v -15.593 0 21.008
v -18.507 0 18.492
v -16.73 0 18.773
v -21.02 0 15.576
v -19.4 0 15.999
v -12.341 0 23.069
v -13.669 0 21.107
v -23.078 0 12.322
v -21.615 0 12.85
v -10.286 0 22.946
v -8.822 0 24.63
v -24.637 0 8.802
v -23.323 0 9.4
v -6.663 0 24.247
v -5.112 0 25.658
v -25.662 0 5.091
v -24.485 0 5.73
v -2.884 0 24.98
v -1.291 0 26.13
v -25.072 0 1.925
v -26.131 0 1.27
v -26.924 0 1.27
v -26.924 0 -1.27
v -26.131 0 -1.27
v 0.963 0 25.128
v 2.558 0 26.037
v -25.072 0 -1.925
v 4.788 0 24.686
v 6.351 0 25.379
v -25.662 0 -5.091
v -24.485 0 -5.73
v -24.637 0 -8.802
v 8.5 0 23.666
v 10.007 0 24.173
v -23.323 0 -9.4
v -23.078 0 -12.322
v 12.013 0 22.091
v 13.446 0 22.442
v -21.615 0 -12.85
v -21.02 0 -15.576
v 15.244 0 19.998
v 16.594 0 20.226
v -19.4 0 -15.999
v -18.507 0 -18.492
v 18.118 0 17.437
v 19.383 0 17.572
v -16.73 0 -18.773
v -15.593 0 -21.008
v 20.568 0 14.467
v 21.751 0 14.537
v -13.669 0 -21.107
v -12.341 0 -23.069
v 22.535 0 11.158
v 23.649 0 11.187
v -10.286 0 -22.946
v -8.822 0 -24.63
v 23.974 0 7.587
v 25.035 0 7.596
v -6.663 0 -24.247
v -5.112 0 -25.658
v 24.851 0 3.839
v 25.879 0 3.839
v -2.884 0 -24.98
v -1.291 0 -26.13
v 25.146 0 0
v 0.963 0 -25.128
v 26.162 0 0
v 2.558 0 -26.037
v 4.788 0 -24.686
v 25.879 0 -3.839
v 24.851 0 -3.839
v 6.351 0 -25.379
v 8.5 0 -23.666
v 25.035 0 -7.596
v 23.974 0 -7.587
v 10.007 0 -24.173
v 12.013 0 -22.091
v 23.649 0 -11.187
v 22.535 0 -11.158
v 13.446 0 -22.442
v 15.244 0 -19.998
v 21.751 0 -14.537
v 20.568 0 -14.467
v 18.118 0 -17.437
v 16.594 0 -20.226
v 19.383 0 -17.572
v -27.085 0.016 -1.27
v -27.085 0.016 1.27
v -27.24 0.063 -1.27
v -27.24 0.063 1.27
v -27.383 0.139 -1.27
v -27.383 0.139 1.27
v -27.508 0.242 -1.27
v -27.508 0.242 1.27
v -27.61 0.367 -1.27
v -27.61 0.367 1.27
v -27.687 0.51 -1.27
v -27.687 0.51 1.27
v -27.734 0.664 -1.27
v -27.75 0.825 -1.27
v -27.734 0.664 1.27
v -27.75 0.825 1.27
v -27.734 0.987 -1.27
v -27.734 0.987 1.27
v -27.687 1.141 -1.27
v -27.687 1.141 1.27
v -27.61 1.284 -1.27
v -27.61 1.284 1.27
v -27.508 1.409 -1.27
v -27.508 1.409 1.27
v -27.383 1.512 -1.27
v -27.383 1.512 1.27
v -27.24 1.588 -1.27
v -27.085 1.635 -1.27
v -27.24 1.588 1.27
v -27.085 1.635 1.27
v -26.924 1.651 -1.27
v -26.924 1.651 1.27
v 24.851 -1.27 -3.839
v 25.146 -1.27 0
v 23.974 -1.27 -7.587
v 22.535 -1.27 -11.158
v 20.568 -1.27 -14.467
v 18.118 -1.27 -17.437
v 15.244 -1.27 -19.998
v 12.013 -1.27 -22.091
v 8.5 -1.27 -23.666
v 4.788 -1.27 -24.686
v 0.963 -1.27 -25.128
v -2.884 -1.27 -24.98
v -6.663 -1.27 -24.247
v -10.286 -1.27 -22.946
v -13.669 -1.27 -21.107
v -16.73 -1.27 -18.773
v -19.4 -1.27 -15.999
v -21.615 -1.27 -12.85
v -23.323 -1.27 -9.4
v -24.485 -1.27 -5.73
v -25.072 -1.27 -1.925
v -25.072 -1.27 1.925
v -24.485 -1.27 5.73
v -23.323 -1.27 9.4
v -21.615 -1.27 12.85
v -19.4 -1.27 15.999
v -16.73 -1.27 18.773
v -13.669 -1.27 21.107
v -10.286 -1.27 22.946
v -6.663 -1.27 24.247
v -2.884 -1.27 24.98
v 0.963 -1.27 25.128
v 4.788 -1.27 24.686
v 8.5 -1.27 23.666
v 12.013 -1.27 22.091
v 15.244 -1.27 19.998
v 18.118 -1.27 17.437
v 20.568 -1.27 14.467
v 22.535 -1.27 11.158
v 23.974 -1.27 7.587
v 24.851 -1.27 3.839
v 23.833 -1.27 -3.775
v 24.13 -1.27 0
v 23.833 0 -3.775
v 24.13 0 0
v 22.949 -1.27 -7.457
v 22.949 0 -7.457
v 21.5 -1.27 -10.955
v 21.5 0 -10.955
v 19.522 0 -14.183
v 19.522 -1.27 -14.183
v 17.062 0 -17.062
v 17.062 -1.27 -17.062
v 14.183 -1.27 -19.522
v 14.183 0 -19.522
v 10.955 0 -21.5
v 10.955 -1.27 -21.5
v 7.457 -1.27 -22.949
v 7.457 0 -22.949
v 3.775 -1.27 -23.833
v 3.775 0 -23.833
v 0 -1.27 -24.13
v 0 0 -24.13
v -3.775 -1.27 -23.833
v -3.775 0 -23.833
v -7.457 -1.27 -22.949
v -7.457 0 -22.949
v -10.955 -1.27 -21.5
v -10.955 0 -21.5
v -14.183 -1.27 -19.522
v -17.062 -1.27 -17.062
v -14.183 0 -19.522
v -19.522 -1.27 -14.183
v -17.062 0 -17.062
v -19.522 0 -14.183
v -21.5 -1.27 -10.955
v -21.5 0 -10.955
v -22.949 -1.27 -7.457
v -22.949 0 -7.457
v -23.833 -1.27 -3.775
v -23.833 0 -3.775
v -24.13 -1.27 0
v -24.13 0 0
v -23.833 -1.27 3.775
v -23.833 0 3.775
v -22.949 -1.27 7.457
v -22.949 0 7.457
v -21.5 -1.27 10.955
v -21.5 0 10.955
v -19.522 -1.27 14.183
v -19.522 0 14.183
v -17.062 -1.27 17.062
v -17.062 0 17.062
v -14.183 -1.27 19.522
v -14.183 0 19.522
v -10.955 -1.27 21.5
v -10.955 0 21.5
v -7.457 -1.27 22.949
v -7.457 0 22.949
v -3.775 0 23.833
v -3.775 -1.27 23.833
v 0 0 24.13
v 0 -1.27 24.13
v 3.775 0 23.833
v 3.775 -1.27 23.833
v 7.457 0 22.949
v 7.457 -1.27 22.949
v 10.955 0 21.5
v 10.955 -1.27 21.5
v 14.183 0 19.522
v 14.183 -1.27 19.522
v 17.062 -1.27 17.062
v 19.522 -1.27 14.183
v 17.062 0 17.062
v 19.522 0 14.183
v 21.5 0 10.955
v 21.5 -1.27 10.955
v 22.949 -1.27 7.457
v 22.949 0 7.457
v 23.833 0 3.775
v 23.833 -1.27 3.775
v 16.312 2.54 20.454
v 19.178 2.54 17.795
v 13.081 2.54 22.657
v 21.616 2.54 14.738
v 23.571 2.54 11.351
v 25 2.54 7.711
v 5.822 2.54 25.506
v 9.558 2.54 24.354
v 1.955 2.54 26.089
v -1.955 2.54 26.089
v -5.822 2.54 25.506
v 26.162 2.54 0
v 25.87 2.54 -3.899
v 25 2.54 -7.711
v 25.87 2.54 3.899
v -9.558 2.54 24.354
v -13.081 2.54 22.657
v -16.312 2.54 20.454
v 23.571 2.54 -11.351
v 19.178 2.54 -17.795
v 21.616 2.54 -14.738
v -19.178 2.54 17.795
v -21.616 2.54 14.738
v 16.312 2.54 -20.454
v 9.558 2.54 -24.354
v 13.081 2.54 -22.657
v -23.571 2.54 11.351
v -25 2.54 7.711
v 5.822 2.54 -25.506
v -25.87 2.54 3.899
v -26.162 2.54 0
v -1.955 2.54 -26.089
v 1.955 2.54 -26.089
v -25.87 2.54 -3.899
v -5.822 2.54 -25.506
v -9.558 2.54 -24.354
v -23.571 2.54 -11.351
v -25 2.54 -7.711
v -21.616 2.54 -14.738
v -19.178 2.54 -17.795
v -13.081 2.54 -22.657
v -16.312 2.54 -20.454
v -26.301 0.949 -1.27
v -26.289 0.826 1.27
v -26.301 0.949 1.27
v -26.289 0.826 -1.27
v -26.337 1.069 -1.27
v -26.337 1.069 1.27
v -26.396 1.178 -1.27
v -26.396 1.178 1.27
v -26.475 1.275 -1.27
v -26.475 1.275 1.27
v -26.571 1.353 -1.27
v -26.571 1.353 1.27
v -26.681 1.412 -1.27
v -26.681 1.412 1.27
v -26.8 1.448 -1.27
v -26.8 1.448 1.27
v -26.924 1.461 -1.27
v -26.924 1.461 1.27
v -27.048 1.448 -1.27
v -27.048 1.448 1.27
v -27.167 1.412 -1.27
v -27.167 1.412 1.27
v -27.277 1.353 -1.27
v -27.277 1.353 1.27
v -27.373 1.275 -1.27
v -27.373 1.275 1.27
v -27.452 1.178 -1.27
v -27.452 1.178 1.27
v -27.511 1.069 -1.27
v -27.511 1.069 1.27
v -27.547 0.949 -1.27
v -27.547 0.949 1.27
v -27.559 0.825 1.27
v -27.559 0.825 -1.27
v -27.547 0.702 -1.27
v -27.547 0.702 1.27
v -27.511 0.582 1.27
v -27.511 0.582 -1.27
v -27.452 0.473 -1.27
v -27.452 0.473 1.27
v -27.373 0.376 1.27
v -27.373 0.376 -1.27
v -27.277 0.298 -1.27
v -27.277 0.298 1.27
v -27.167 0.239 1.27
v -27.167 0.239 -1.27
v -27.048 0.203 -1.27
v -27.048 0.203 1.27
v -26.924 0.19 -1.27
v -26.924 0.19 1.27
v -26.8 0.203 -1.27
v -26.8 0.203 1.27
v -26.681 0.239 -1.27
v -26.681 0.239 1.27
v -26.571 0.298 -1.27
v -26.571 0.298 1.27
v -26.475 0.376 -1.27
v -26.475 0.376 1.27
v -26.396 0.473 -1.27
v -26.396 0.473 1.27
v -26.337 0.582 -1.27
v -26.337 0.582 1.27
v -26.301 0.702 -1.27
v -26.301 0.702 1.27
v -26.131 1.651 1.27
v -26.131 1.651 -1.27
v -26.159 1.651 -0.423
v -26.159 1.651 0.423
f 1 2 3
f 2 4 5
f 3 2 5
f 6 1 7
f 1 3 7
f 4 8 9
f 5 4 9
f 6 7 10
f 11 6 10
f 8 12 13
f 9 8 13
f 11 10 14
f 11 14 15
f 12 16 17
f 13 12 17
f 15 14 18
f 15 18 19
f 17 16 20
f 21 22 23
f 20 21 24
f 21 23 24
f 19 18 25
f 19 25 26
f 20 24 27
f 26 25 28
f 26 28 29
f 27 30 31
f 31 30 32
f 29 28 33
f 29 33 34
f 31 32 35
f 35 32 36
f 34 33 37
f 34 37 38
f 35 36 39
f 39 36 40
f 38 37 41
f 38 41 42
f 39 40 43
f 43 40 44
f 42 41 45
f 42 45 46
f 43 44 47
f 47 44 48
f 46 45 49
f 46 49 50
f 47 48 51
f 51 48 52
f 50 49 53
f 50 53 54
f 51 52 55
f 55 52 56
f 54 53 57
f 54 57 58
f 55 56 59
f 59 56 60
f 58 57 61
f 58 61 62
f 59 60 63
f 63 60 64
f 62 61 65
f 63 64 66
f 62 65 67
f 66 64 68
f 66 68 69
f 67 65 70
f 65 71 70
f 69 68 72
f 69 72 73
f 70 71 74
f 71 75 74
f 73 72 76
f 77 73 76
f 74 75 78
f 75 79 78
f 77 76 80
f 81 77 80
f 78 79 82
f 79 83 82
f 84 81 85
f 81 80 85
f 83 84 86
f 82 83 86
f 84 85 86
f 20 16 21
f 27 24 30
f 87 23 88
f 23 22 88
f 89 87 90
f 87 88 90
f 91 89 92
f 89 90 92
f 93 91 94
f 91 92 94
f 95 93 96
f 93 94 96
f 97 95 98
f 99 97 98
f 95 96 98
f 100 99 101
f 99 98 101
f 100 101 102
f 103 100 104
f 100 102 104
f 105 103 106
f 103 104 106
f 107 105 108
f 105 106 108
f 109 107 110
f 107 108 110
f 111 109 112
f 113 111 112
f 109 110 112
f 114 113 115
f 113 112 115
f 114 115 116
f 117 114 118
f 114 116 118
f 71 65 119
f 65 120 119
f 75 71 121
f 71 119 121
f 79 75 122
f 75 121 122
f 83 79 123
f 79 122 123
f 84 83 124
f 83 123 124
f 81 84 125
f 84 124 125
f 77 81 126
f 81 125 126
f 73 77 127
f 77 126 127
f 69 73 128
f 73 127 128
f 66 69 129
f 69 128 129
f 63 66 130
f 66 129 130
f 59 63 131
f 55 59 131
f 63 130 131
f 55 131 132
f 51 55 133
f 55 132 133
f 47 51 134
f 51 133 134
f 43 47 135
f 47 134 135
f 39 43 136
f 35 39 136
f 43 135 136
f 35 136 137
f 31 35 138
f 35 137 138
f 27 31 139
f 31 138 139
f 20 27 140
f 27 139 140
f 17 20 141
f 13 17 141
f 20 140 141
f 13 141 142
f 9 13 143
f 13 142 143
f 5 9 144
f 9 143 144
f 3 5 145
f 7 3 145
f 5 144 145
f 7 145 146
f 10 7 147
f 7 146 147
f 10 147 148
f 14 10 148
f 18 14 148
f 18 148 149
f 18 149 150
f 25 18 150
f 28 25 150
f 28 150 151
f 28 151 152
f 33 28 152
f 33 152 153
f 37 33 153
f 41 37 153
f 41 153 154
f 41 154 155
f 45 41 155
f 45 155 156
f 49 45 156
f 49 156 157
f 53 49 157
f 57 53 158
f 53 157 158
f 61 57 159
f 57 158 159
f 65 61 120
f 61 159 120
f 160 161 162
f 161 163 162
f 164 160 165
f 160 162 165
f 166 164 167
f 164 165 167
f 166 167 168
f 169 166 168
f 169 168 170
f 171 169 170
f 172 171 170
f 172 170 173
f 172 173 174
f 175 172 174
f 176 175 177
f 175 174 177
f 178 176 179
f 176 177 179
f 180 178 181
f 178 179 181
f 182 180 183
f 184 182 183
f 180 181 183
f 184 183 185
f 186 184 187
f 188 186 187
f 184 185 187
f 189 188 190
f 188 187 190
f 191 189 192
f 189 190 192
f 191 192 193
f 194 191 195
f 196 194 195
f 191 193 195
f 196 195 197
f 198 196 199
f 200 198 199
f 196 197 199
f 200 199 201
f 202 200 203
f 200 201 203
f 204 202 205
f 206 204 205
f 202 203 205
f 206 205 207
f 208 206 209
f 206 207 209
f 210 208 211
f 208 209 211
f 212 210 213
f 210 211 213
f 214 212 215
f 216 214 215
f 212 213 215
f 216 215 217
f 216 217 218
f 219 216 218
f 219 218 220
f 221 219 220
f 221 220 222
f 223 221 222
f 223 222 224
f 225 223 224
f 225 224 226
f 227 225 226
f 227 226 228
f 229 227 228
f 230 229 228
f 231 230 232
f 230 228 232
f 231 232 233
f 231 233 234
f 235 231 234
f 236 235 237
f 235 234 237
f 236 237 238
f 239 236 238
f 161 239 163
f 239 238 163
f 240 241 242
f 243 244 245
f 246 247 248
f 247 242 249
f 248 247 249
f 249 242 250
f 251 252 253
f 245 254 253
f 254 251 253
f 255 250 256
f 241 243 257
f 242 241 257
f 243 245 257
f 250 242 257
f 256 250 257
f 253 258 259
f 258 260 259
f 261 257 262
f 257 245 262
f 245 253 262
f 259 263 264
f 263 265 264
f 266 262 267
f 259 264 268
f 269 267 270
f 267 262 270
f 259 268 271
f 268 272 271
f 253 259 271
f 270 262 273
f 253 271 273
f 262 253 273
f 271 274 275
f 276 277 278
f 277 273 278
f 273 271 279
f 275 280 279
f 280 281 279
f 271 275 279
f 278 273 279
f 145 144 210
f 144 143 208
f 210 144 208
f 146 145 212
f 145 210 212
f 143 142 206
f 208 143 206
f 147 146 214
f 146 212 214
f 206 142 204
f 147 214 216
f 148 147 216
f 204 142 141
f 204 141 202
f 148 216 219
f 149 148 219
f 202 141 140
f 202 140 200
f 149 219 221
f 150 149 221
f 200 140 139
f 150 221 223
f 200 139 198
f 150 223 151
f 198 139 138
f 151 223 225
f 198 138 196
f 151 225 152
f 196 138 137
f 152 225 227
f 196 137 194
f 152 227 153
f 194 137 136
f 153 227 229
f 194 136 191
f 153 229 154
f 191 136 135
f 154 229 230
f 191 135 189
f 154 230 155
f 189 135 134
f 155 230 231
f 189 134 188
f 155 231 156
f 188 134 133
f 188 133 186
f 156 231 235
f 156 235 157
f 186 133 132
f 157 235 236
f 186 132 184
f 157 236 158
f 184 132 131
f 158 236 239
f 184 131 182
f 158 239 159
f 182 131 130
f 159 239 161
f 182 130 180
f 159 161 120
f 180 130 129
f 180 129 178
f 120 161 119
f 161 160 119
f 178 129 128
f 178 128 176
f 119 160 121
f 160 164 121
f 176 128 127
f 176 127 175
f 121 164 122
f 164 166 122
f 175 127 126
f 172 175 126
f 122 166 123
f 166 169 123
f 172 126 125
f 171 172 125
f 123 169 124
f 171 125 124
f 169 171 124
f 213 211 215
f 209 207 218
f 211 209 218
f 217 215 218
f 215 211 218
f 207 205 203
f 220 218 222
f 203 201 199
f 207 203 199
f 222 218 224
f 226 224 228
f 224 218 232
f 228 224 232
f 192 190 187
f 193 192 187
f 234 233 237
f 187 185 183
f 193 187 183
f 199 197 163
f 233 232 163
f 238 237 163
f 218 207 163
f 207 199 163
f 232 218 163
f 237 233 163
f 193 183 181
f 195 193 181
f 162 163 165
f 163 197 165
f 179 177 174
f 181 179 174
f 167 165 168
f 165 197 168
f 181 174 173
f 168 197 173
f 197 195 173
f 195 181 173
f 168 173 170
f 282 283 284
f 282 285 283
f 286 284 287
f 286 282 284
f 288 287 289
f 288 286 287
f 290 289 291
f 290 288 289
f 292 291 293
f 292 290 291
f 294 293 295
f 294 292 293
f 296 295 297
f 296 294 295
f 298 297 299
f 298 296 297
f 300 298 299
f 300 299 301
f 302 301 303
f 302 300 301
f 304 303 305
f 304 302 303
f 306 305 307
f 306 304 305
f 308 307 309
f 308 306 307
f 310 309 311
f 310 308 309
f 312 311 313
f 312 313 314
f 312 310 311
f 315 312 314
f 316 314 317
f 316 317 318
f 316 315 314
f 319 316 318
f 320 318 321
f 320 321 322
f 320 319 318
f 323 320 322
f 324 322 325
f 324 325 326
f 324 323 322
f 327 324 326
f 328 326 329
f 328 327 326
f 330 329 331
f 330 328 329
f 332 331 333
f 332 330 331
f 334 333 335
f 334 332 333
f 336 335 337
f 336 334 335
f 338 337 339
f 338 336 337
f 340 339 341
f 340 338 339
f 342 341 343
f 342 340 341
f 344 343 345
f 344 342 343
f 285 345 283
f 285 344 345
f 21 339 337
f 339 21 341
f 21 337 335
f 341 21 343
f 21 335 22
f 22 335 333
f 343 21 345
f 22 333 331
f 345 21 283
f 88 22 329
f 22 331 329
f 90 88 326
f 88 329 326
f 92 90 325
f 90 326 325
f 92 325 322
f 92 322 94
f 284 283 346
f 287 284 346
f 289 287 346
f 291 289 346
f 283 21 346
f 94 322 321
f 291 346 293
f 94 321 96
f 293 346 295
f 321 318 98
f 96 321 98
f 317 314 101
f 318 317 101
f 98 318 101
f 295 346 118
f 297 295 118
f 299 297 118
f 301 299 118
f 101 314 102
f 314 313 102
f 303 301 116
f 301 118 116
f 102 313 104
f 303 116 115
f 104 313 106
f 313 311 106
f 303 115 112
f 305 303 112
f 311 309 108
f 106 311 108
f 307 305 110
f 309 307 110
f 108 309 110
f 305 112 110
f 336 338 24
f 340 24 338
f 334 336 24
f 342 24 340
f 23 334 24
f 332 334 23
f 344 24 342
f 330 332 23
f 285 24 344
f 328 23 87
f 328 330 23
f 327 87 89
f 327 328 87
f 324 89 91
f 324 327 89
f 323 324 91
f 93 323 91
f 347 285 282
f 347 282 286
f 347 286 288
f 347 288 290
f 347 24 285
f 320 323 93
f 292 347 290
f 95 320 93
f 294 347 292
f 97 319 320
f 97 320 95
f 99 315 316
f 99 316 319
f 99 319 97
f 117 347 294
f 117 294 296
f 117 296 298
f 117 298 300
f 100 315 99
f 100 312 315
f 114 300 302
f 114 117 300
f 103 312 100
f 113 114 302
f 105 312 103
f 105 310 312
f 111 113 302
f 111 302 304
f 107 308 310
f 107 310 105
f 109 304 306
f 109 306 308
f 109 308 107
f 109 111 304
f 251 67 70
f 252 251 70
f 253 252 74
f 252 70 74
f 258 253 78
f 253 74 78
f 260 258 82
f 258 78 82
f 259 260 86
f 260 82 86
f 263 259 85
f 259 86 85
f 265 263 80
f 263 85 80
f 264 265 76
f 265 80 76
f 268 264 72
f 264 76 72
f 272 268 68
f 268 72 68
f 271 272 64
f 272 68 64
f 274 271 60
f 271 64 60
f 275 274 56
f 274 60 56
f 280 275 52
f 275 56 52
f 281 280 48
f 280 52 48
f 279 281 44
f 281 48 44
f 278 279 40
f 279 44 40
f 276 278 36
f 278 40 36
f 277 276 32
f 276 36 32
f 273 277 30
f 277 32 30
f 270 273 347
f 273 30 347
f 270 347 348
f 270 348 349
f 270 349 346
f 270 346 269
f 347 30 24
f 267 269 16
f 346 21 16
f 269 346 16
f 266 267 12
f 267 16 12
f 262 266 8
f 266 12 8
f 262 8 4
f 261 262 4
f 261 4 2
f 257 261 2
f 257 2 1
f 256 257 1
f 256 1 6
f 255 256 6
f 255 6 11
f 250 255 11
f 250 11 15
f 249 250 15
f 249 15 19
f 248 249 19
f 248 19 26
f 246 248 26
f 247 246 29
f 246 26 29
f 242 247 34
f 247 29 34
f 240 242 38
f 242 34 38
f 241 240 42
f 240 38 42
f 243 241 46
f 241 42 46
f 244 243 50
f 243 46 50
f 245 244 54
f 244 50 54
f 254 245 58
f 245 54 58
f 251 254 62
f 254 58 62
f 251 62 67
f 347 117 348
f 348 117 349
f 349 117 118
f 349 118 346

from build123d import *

# Parameters (mm, degrees)
SKETCH3_R           = 0.635
BOSS_EXTRUDE1_DEPTH = 1.27


with BuildPart() as part:
    # Sketch2 → Revolve1 (revolve)
    with BuildSketch(Plane.XY):
        Polygon((0, 0), (0, 2.54), (26.162, 2.54), (26.162, 0), (25.146, 0), (25.146, -1.27), (24.13, -1.27), (24.13, 0), align=None)
    revolve(axis=Axis((0, -1000, 0), (0, 1, 0)))

    # Sketch3 → Boss-Extrude1 (add, symmetric)
    with BuildSketch(Plane.XY):
        with BuildLine():
            Line((-25.4, 1.651), (-25.4, 0))
            Line((-25.4, 0), (-26.924, 0))
            ThreePointArc((-26.924, 0), (-27.7495, 0.8255), (-26.924, 1.651))
            Line((-26.924, 1.651), (-25.4, 1.651))
        make_face()
        with Locations((-26.924, 0.8255)):
            Circle(SKETCH3_R, mode=Mode.SUBTRACT)
    extrude(amount=BOSS_EXTRUDE1_DEPTH, both=True)


solid = part.part
